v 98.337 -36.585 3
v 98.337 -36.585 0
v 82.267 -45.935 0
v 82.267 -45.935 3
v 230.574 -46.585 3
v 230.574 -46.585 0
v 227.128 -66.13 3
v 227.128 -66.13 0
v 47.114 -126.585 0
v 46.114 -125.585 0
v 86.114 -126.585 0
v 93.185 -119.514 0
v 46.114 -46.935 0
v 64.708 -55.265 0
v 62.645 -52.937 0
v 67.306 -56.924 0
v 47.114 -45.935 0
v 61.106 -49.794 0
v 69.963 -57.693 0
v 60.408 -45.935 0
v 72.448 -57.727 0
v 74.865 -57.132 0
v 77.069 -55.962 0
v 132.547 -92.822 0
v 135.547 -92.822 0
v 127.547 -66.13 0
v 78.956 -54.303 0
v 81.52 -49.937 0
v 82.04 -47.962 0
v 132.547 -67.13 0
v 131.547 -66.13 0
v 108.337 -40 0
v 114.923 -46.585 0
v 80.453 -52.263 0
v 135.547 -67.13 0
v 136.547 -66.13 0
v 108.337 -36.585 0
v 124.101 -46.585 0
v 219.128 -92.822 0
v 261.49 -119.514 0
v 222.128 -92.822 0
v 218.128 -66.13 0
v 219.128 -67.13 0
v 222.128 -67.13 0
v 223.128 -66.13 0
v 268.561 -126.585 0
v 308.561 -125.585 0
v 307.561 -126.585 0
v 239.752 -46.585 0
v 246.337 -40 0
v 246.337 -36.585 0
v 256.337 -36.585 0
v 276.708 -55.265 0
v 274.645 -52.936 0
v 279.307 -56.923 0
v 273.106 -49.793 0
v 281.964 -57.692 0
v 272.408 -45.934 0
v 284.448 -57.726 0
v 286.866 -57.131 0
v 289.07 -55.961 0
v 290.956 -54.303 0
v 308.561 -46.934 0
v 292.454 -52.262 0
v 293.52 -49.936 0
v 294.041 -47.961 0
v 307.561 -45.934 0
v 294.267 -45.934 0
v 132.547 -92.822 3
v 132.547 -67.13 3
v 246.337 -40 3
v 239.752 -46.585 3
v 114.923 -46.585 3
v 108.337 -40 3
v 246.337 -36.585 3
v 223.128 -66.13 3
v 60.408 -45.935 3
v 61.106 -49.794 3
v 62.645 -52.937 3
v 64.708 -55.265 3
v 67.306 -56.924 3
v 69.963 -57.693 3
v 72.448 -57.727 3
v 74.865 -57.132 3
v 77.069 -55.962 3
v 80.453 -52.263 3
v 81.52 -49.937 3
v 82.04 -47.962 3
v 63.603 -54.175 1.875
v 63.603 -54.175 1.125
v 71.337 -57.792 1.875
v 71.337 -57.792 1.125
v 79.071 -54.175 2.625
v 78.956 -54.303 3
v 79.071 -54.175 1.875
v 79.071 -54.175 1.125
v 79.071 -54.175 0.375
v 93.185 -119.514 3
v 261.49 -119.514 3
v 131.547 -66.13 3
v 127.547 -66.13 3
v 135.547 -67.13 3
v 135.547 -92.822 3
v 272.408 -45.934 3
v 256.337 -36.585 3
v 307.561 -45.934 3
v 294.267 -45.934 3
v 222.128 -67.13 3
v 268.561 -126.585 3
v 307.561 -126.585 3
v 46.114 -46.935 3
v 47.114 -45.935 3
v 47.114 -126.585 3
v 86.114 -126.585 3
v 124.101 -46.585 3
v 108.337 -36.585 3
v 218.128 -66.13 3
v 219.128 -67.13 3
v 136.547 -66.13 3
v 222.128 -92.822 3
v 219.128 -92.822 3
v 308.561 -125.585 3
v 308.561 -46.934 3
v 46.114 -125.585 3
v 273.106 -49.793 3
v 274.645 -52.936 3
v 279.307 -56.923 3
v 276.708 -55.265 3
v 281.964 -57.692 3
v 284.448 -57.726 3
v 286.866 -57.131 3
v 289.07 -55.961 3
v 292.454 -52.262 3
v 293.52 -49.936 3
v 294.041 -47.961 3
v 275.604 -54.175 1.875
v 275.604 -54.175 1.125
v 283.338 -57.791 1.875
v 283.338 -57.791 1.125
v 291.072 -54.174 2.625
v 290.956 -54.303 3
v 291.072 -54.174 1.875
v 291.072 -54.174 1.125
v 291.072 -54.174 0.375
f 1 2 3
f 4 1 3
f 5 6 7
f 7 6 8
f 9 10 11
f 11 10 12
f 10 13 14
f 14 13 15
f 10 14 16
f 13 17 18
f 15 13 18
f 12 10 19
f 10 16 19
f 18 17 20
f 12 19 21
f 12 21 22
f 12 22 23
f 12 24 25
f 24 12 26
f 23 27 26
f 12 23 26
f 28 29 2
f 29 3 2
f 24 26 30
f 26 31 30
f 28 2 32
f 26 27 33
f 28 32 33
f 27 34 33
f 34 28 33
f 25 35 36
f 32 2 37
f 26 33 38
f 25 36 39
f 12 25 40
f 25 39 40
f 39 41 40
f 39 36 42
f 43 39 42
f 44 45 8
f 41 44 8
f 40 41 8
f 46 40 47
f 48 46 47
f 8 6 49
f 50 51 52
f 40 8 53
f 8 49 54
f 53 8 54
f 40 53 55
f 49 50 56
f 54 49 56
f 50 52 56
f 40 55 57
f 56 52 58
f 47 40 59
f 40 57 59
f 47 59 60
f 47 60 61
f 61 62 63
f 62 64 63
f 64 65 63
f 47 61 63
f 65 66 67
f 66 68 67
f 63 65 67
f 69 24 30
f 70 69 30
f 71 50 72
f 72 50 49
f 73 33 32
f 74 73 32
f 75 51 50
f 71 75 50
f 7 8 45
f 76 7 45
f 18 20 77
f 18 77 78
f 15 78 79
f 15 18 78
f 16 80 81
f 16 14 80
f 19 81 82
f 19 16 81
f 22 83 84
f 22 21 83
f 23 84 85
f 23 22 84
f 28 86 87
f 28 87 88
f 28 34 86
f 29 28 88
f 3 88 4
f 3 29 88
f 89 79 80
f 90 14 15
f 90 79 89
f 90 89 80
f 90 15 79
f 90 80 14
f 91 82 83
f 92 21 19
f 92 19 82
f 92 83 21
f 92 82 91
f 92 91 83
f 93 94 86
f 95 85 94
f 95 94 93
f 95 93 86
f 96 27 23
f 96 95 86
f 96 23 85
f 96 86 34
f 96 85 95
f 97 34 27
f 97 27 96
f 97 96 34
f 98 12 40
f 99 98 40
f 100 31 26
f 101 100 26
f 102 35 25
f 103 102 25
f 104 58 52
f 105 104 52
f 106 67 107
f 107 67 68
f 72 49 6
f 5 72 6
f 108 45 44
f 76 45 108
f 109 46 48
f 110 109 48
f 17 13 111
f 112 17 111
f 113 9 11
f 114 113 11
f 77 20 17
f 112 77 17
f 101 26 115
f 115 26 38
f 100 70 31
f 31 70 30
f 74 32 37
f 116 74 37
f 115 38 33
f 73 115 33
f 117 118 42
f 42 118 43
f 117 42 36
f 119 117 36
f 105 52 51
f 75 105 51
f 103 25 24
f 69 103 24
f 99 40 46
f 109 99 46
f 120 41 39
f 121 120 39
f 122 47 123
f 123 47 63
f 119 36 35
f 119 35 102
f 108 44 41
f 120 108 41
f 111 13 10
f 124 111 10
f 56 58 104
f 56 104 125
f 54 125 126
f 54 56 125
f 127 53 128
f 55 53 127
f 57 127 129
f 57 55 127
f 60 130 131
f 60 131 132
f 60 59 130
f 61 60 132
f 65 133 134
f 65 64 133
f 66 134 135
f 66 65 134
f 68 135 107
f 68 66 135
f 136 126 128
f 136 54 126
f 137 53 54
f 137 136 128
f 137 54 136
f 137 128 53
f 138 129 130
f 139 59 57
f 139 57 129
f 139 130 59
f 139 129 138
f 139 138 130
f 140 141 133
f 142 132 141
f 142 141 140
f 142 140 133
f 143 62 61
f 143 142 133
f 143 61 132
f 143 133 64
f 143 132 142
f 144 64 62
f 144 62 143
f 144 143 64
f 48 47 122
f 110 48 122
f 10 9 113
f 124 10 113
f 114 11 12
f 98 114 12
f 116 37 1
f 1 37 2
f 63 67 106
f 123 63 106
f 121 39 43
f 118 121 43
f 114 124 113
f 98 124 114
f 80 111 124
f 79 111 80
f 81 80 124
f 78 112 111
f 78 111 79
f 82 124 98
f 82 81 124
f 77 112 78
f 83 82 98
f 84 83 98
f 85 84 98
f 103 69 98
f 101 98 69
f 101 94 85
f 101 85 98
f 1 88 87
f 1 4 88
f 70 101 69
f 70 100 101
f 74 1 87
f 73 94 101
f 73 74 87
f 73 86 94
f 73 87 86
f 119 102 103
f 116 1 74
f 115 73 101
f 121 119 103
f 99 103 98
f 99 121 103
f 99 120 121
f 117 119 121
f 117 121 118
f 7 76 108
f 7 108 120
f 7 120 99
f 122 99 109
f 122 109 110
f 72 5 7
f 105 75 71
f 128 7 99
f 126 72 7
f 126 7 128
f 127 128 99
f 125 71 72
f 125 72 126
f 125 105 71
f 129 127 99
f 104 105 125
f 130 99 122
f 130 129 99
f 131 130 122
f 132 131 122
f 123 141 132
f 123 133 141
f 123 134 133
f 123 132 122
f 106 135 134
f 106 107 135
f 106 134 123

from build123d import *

# Parameters (mm, degrees)
BOSS_EXTRUDE1_DEPTH = 3
SKETCH2_W           = 3
SKETCH2_H           = 4.791544689
CUT_EXTRUDE1_DEPTH  = 15
CHAMFER1_SIZE       = 1
CHAMFER2_SIZE       = 1


with BuildPart() as part:
    # Sketch1 → Boss-Extrude1 (new body)
    with BuildSketch(Plane.XY):
        with BuildLine():
            Line((93.184787819, -119.514382091), (261.489822447, -119.514382091))
            Line((261.489822447, -119.514382091), (268.560890259, -126.585449903))
            Line((268.560890259, -126.585449903), (308.560890259, -126.585449903))
            Line((308.560890259, -126.585449903), (308.560890259, -45.93363109))
            Line((308.560890259, -45.93363109), (294.267338786, -45.93363109))
            add(Edge.make_bspline(
                [(272.407878144, -45.934404782), (272.465337406, -47.438364471), (273.073186229, -50.465203155), (275.397677042, -54.367125899), (278.960411882, -57.115608226), (283.338040094, -58.12903526), (287.715596557, -57.115298346), (291.278136829, -54.366563828), (293.602351427, -50.464476548), (294.209985986, -47.437594843), (294.267338786, -45.93363109)],
                knots=[-1.525660034, -1.525660034, -1.525660034, -1.525660034, -1.144245025, -0.762830017, -0.381415008, 0, 0.381415008, 0.762830017, 1.144245025, 1.525660034, 1.525660034, 1.525660034, 1.525660034], degree=3))
            Line((272.407878144, -45.934404782), (256.337305133, -36.585449903))
            Line((256.337305133, -36.585449903), (246.337305133, -36.585449903))
            Line((246.337305133, -36.585449903), (246.337305133, -39.999663466))
            Line((246.337305133, -39.999663466), (239.751518696, -46.585449903))
            Line((239.751518696, -46.585449903), (230.574035326, -46.585449903))
            Line((230.574035326, -46.585449903), (227.127859803, -66.129682494))
            Line((227.127859803, -66.129682494), (127.546750463, -66.129682494))
            Line((127.546750463, -66.129682494), (124.10057494, -46.585449903))
            Line((124.10057494, -46.585449903), (114.923091571, -46.585449903))
            Line((114.923091571, -46.585449903), (108.337305133, -39.999663466))
            Line((108.337305133, -39.999663466), (108.337305133, -36.585449903))
            Line((108.337305133, -36.585449903), (98.337305133, -36.585449903))
            Line((98.337305133, -36.585449903), (82.267030577, -45.934761617))
            add(Edge.make_bspline(
                [(60.407579689, -45.934761617), (60.464998848, -47.438718586), (61.072758356, -50.465565598), (63.397111959, -54.367547882), (66.959733327, -57.116142381), (71.337305133, -58.129720884), (75.714876939, -57.116142381), (79.277498308, -54.367547882), (81.60185191, -50.465565598), (82.209611419, -47.438718586), (82.267030577, -45.934761617)],
                knots=[1.615943427, 1.615943427, 1.615943427, 1.615943427, 1.997355734, 2.37876804, 2.760180347, 3.141592654, 3.52300496, 3.904417267, 4.285829573, 4.66724188, 4.66724188, 4.66724188, 4.66724188], degree=3))
            Line((60.407579689, -45.934761617), (46.113720007, -45.934761617))
            Line((46.113720007, -45.934761617), (46.113720007, -126.585449903))
            Line((46.113720007, -126.585449903), (86.113720007, -126.585449903))
            Line((86.113720007, -126.585449903), (93.184787819, -119.514382091))
        make_face()
    extrude(amount=BOSS_EXTRUDE1_DEPTH)

    # Sketch2 → Cut-Extrude1 (cut)
    with BuildSketch(Plane(origin=(0, 0, 0), x_dir=(-1, 0, 0), z_dir=(0, 0, -1))):
        Polygon((-222.127859803, -66.129682494), (-222.127859803, -71.338137805), (-222.127859803, -92.822032293), (-219.127859803, -92.822032293), (-219.127859803, -71.338137805), (-219.127859803, -66.129682494), align=None)
        with Locations((-220.627859803, -63.73391015)):
            Rectangle(SKETCH2_W, SKETCH2_H)
        with Locations((-134.046750463, -63.73391015)):
            Rectangle(SKETCH2_W, SKETCH2_H)
        Polygon((-132.546750463, -66.129682494), (-135.546750463, -66.129682494), (-135.546750463, -71.338137805), (-135.546750463, -92.822032293), (-132.546750463, -92.822032293), (-132.546750463, -71.338137805), align=None)
    extrude(amount=-CUT_EXTRUDE1_DEPTH, mode=Mode.SUBTRACT)

    # Chamfer1
    chamfer1_edges = [part.edges().sort_by_distance(p)[0] for p in [
        (222.127859803, -66.129682494, 1.5),
        (219.127859803, -66.129682494, 1.5),
        (132.546750463, -66.129682494, 1.5),
        (135.546750463, -66.129682494, 1.5),
    ]]
    chamfer(chamfer1_edges, length=CHAMFER1_SIZE)

    # Chamfer2
    chamfer2_edges = [part.edges().sort_by_distance(p)[0] for p in [
        (308.560890259, -45.93363109, 1.5),
        (308.560890259, -126.585449903, 1.5),
        (46.113720007, -126.585449903, 1.5),
        (46.113720007, -45.934761617, 1.5),
    ]]
    chamfer(chamfer2_edges, length=CHAMFER2_SIZE)


solid = part.part
